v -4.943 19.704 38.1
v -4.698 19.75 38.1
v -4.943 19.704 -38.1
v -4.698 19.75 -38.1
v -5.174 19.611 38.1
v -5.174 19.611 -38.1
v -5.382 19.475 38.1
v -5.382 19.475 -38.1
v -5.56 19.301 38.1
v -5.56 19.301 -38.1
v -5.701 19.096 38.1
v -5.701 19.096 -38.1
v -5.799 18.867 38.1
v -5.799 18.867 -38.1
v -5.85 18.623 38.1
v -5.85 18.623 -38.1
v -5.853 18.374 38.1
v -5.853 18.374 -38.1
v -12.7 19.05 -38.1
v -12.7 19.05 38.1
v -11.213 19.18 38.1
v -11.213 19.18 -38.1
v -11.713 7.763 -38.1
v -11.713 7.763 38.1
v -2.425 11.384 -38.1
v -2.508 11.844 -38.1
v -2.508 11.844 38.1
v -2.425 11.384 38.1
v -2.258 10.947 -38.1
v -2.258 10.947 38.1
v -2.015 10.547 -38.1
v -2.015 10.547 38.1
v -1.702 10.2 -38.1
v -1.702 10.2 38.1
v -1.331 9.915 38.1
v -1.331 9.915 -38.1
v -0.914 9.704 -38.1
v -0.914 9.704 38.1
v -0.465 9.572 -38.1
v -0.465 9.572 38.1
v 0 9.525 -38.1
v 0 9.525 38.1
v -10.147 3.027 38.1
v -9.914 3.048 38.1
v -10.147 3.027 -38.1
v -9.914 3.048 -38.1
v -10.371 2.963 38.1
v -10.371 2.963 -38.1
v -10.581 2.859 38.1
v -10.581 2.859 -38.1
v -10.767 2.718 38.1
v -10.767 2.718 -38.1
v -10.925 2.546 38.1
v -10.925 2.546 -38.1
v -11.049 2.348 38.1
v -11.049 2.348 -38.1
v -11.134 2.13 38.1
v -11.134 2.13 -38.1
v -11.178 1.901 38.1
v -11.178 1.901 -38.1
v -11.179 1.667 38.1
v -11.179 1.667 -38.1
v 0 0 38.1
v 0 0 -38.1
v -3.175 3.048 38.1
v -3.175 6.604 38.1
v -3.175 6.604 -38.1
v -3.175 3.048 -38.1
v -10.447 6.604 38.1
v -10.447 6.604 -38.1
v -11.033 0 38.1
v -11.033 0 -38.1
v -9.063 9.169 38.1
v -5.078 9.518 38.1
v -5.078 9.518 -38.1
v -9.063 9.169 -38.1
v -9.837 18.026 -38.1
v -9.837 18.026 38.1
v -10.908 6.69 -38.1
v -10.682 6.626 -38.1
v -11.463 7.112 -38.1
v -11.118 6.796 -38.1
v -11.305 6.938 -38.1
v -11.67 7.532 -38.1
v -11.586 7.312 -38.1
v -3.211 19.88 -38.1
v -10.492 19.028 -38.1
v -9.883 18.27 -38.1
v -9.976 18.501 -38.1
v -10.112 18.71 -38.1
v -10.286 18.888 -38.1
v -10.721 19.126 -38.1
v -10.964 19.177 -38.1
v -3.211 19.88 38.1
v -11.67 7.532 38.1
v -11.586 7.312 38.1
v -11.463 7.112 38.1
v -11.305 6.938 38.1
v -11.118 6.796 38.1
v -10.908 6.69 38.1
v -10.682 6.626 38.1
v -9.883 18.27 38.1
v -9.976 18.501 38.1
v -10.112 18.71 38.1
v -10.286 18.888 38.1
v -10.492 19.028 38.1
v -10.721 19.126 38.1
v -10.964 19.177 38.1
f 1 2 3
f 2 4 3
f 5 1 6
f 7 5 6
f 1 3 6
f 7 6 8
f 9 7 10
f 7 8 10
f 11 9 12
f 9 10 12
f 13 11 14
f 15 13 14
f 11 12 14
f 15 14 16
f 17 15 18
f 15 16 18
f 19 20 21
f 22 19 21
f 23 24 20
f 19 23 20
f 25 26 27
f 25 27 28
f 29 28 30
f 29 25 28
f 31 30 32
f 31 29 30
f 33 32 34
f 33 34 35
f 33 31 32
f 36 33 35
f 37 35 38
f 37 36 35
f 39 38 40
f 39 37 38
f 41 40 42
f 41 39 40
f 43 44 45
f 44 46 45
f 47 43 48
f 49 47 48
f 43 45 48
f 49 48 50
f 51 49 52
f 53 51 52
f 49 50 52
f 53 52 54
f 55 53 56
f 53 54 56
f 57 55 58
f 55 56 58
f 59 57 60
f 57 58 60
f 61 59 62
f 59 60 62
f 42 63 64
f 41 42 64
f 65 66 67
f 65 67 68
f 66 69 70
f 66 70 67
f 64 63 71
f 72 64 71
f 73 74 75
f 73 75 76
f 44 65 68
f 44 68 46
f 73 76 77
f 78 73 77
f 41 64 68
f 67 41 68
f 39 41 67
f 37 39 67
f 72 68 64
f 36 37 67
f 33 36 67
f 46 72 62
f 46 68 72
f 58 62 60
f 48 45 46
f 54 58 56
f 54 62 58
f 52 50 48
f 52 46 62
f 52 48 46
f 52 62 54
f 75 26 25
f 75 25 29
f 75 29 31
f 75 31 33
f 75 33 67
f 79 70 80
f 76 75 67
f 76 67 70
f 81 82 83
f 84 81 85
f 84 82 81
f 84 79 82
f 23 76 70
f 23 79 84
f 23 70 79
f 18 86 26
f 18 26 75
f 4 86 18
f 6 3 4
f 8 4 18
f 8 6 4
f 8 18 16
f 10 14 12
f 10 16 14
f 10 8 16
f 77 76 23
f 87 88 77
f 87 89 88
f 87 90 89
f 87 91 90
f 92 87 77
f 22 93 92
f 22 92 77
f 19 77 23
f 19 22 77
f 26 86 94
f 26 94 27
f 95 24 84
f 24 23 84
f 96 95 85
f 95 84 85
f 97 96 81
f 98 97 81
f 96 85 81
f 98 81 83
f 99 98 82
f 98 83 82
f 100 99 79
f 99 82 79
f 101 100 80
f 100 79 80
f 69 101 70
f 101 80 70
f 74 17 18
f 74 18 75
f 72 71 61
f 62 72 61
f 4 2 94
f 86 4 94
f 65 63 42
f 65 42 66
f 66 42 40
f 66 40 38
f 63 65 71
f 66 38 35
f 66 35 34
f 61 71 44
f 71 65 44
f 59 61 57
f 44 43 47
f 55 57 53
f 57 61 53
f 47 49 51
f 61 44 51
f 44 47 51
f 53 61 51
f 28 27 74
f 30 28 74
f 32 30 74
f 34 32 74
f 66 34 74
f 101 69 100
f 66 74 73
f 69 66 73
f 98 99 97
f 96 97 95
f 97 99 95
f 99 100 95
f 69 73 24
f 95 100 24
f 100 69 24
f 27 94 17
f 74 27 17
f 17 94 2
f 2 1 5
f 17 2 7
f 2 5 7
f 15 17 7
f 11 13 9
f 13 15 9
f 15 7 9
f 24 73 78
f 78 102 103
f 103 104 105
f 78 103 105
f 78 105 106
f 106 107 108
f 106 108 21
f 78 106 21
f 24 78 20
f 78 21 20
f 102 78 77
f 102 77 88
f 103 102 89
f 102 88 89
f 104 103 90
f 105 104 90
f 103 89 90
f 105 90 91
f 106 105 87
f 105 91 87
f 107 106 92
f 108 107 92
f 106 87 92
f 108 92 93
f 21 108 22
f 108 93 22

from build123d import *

# Parameters (mm, degrees)
BOSS_EXTRUDE1_DEPTH = 38.1
CUT_EXTRUDE1_DEPTH  = 80.768105782
FILLET1_R           = 2.54
FILLET2_R           = 1.27


with BuildPart() as part:
    # Sketch1 → Boss-Extrude1 (new, symmetric)
    with BuildSketch(Plane.XY):
        Polygon((0, 0), (-11.03334096, 0), (-12.7, 19.05), (-3.211245501, 19.88015845), (-2.305286527, 9.525), (0, 9.525), align=None)
    extrude(amount=BOSS_EXTRUDE1_DEPTH, both=True)

    # Sketch2 → Cut-Extrude1 (cut, through all)
    with BuildSketch(Plane.XY.offset(38.1)):
        Polygon((-5.963233354, 19.63939071), (-5.077731008, 9.518052578), (-9.0625098, 9.169429607), (-9.948012147, 19.290767739), align=None)
        Polygon((-11.611116094, 6.604), (-3.175, 6.604), (-3.175, 3.048), (-11.300006406, 3.048), align=None)
    extrude(amount=-CUT_EXTRUDE1_DEPTH, mode=Mode.SUBTRACT)

    # Fillet1
    # the kernel refuses this fillet: 2.54 mm, written as the material it adds along each edge
    with BuildSketch(Plane(origin=(-2.305286527, 9.525, -38.1), x_dir=(1, 0, 0), z_dir=(0, 0, 1))) as fillet1_piece_1_section:
        with BuildLine():
            CenterArc((FILLET1_R * 0.916331174017, FILLET1_R), FILLET1_R, 185, 85)
            Line((-FILLET1_R * 0.0798635240743, FILLET1_R * 0.912844257252), (0, 0))
            Line((0, 0), (FILLET1_R * 0.916331174017, 0))
        make_face()
    fillet1_piece_1 = extrude(amount=76.2, mode=Mode.PRIVATE)
    fillet1_piece_1 = split(fillet1_piece_1, bisect_by=Plane(origin=(0, 10.045448834, 0), z_dir=(-1, 0, 0)), keep=Keep.TOP, mode=Mode.PRIVATE)
    add(fillet1_piece_1)

    # Fillet2
    fillet2_edges = [part.edges().sort_by_distance(p)[0] for p in [
        (-9.948012147, 19.290767739, 0),
        (-5.963233354, 19.63939071, 0),
        (-11.300006406, 3.048, 0),
        (-11.611116094, 6.604, 0),
    ]]
    fillet(fillet2_edges, radius=FILLET2_R)


solid = part.part
